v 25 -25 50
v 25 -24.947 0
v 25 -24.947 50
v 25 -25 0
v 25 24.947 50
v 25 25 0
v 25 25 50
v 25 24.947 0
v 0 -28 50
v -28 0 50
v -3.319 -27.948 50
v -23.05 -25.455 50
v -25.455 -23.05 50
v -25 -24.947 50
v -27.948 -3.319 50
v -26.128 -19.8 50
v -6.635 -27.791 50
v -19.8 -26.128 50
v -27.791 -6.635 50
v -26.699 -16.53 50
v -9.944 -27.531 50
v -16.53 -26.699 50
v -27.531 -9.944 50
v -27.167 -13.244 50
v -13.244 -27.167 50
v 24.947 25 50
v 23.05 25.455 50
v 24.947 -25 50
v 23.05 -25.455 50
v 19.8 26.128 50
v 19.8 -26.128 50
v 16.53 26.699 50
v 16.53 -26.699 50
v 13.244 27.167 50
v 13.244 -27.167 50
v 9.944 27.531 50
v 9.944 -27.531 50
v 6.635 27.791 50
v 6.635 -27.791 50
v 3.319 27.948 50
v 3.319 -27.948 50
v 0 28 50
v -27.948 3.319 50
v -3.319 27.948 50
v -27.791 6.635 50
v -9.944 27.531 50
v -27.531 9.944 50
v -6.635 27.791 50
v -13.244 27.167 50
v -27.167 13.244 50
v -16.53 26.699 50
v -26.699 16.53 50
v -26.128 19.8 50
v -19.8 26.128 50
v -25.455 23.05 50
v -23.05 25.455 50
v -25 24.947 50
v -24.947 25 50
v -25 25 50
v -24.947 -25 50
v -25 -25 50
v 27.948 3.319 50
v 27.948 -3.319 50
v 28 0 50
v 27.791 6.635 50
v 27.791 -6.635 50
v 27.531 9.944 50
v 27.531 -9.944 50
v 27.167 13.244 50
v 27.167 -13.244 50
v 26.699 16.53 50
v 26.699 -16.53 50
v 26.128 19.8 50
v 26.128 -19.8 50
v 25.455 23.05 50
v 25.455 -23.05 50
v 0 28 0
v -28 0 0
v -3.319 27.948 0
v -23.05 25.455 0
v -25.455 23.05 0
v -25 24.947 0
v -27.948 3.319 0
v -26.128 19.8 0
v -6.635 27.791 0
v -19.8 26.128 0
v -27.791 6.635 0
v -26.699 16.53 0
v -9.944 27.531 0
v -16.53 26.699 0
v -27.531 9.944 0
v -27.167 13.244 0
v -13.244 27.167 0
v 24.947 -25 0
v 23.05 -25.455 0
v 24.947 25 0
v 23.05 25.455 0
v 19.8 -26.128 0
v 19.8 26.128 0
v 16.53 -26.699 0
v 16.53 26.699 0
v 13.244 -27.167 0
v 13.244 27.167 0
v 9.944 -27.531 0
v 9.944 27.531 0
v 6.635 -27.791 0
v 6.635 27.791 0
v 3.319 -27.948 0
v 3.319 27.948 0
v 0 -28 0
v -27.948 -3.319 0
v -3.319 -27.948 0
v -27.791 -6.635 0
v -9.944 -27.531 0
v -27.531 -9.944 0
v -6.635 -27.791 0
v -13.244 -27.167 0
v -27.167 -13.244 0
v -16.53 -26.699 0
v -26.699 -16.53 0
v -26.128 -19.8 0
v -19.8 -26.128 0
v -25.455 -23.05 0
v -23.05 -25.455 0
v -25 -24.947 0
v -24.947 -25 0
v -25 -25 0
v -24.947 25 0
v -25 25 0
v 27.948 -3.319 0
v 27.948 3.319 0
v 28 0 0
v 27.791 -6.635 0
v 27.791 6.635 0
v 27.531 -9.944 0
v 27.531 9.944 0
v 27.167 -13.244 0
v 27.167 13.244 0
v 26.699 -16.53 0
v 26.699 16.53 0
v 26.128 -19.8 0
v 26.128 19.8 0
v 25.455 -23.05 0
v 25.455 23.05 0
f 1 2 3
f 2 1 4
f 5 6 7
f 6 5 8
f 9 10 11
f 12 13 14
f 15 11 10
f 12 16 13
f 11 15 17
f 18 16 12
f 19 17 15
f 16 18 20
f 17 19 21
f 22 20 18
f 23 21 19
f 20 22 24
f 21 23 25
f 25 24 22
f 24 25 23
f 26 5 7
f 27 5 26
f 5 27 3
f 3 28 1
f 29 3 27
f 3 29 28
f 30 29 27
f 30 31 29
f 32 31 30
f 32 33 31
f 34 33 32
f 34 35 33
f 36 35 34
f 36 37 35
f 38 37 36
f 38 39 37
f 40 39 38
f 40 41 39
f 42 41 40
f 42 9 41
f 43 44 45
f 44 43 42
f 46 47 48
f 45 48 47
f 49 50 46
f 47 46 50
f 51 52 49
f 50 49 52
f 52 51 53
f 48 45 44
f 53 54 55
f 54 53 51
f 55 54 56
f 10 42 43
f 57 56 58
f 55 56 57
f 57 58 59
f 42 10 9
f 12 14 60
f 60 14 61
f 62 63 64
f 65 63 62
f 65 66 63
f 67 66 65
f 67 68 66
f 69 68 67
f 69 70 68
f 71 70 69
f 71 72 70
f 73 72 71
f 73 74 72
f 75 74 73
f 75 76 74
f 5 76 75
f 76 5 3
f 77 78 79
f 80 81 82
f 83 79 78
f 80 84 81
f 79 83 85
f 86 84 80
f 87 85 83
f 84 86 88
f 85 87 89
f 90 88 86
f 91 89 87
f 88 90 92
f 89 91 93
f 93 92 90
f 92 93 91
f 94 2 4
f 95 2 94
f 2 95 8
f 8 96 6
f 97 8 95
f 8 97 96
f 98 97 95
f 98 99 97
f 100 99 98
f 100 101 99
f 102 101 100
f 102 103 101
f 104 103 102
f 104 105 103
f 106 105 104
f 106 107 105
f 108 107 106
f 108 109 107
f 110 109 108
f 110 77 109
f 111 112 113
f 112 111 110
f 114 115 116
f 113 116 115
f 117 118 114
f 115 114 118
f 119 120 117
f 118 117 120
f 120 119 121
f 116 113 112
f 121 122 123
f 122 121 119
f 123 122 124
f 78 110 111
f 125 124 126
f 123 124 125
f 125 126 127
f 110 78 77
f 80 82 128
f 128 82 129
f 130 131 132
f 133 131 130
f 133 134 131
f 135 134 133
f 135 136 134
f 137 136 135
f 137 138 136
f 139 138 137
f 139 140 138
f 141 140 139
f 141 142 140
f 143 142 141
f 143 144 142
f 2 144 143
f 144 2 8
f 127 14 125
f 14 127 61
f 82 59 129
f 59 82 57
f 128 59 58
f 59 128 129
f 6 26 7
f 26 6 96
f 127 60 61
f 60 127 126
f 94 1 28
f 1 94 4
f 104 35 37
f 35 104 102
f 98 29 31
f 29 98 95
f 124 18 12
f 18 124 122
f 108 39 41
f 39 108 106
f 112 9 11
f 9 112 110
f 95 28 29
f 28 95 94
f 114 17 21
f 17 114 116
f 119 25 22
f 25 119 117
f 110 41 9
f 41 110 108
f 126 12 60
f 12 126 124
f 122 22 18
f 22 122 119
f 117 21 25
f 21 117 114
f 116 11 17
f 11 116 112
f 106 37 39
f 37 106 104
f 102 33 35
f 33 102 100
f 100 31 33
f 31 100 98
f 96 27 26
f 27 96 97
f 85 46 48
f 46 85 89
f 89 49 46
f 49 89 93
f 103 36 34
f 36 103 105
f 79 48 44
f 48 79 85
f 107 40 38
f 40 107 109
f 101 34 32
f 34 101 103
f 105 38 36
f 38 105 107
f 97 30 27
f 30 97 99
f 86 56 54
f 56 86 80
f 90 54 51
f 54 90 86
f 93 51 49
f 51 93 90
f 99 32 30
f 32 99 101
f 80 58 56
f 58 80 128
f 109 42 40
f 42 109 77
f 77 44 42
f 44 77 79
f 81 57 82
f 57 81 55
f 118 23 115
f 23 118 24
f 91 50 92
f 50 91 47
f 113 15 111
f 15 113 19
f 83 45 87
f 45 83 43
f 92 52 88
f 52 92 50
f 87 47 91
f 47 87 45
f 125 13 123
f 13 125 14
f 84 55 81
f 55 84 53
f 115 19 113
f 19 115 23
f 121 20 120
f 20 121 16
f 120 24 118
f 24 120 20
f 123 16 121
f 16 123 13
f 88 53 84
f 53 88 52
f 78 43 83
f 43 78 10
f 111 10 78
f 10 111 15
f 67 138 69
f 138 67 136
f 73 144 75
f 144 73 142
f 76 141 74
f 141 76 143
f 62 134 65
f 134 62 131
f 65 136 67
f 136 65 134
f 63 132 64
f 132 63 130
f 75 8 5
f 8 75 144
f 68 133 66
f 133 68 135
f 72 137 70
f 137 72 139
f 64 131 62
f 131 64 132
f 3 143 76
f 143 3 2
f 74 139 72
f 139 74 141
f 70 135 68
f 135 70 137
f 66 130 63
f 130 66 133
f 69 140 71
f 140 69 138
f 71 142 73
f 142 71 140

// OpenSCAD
// file: ../math/vect.scad
function vect_scalar_sum(v, incr) = [for (i = [0: len(v) - 1]) v[i] + incr];

function vSize(size) = (!is_list(size)) ? [size, size, size]: size; 


function vect_2d_to_3d(vect, z = 0) = [vect[0], vect[1], z];

function vect_rotate2d(vect, b) = [
    cos(b) * vect[0] - sin(b) * vect[1],
    sin(b) * vect[0] + cos(b) * vect[1]
];

function round_vect(v) = [for (i = [0: len(v) - 1]) round(v[i])];

function vect_swap_xy(v1) = [v1.y, v1.x, v1.z];

function vectorize_2(x) = is_list(x) ? [x.x, x.y] : [x, x];

function vectorize_3(x) = is_list(x) ? [x.x, x.y, x.z] : [x, x, x];

echo (vectorize_3(1));
// file: ../math/align.scad
use <vect.scad>
module align_center(sizes, center = true, centerZ = false, vector=[1, 1, 0]){
    xxx=vector.x;
    yyy=vector.y;
    zzz=centerZ || vector.z;
    sizes = vSize(sizes);
    if (center){
        translate([xxx ? -sizes[0] / 2 : 0, yyy ? -sizes[1] / 2: 0, zzz ? -sizes[2]/2 : 0]){
            children();
        }
    } else {
        children();
    }   
}

module align_uncenter(sizes, uncenter = true, uncenterZ = false){
    sizes = vSize(sizes);
    if (uncenter){
        translate([sizes[0] / 2, sizes[1] / 2, (uncenterZ ? sizes[2]/2 : 0)]){
            children();
        }
    } else {
        children();
    }   
}

ALIGN_LEFT=[1, 0, 0];
ALIGN_RIGHT=[-1, 0, 0];
ALIGN_BOTTOM=[0, 0, -1];
ALIGN_TOP=[0, 0, 1];
ALIGN_BACK=[0, -1, 0];
ALIGN_FWD=[0, 1, 0];

function _aligner(target, source, align) = 
            align > 0 ? target * align:
            align < 0 ? source * align:
            (target - source) / 2;    

function aligner(target_sizes, source_sizes, vector) = [
    vector.x == undef ? 0 : _aligner(target_sizes.y, source_sizes.x, vector.x),
    vector.y == undef ? 0 : _aligner(target_sizes.y, source_sizes.y, vector.y),
    vector.z == undef ? 0 : _aligner(target_sizes.z, source_sizes.z, vector.z)
];

module align_relative(
    target_sizes, 
    source_sizes, 
    vector=[0,0,undef]
    ){
        
    // x = vector.x == undef ? 0 : _aligner(target_sizes.y, source_sizes.x, vector.x);
    // y = vector.y == undef ? 0 : _aligner(target_sizes.y, source_sizes.y, vector.y);
    // z = vector.z == undef ? 0 : _aligner(target_sizes.z, source_sizes.z, vector.z);
    translate(aligner(target_sizes, source_sizes, vector))
        children();
}

module align_center_source_vs_target(target_sizes, source_sizes, centerZ = false){
    align_relative(target_sizes=target_sizes, source_sizes=source_sizes, vector=[0, 0, centerZ ? 1 : 0]);
    // align_uncenter(target_sizes, uncenterZ = centerZ)
    // union(){
    //     align_center(target_sizes, center = true, centerZ = centerZ)
    //         children(0);
    //     align_center(source_sizes, center = true, centerZ = centerZ)
    //         children(1);
    // }
}


module zz(z){
    translate([0, 0, z])
        children();
}

module xx(x){
    translate([x, 0, 0])
        children();
}

module yy(y){
    translate([0, y, 0])
        children();
}

module rz(z){
    rotate([0, 0, z])
        children();
}

module rx(x){
    rotate([x, 0, 0])
        children();
}

module ry(y){
    rotate([0, y, 0])
        children();
}

module zc(){
    translate([0, 0, -0.01])
        children();
}
module xc(){
    translate([-0.01, 0, 0])    
        children();
}
module yc(){
    translate([0, -0.01, 0])
        children();
}

// align_center_source_vs_target([100, 100, 1], [10, 10, 10], centerZ = false){
//     cube([100,100,1]);
//     cube([10,10,10]);
// }

// align_center(20){
//     align_uncenter(20){
//         cube(20);
//     }
// }

// target_sizes = [20, 20, 20];
// source_sizes = [10, 10, 10];
// color("azure",0.25)
//     cube(size=target_sizes);
// align_relative(target_sizes=target_sizes, source_sizes=source_sizes, vector=[0, 0, undef]){
//     color("red",0.25)
//         zz(20)
//         cube(size=source_sizes);
// }
// main file
use <../math/align.scad>

function _R(l, h) = (pow(l, 2) + pow(h, 2)) / (2 * h);

module arc_2d(w, h){
    r = _R( w/2, h);    
    difference() {
        translate([0, - r + h]) 
            circle(r=r);
        mirror([0, 1, 0]) 
        translate([-r - 5, 0, 0]) 
            square([r*2 + 10, r * 2 + 10]);
    }
}
// x - arc width
// y - arc height
// h - arc extrude height
module arc_3d(x, y, h){
    translate(v = [x / 2, 0]) 
    linear_extrude(height=h) 
        arc_2d(x, y);
}

module arc_cube(size, arcSizes, 
    compensateArcs = true,
    center = false
    ){
    arcSizes = is_list(arcSizes) ? arcSizes : [arcSizes, arcSizes, arcSizes, arcSizes];
    module _main_arc(){
        cube(size);
        mirror([0, 1, 0]) 
            arc_3d(size.x, arcSizes.x, size.z); 
        translate([0, size.y, 0])
            arc_3d(size.x, arcSizes.x, size.z); 
        rotate([0, 0, 90])
            arc_3d(size.x, arcSizes.y, size.z); 
        
        translate([size.x, 0, 0]) mirror([0, 1, 0]) rotate([0, 0, -90])
            arc_3d(size.x, arcSizes.y, size.z); 
    }


    if (!center){
        translate(compensateArcs ? [arcSizes[2], arcSizes[3]] : [0, 0]) _main_arc();
    } else {
        align_center(sizes = size)
        _main_arc();
    }
}

$fn=200;
arc_cube(size = [50, 50, 50], arcSizes = 3, center = true);
// // linear_extrude(height=10) 
// //     arc_2d(20, 3);

// // h = 3;
// // w = 20;
// // r = _R( w/2, h);
// $fn=100;
// arc_3d(40, 10, 20);
